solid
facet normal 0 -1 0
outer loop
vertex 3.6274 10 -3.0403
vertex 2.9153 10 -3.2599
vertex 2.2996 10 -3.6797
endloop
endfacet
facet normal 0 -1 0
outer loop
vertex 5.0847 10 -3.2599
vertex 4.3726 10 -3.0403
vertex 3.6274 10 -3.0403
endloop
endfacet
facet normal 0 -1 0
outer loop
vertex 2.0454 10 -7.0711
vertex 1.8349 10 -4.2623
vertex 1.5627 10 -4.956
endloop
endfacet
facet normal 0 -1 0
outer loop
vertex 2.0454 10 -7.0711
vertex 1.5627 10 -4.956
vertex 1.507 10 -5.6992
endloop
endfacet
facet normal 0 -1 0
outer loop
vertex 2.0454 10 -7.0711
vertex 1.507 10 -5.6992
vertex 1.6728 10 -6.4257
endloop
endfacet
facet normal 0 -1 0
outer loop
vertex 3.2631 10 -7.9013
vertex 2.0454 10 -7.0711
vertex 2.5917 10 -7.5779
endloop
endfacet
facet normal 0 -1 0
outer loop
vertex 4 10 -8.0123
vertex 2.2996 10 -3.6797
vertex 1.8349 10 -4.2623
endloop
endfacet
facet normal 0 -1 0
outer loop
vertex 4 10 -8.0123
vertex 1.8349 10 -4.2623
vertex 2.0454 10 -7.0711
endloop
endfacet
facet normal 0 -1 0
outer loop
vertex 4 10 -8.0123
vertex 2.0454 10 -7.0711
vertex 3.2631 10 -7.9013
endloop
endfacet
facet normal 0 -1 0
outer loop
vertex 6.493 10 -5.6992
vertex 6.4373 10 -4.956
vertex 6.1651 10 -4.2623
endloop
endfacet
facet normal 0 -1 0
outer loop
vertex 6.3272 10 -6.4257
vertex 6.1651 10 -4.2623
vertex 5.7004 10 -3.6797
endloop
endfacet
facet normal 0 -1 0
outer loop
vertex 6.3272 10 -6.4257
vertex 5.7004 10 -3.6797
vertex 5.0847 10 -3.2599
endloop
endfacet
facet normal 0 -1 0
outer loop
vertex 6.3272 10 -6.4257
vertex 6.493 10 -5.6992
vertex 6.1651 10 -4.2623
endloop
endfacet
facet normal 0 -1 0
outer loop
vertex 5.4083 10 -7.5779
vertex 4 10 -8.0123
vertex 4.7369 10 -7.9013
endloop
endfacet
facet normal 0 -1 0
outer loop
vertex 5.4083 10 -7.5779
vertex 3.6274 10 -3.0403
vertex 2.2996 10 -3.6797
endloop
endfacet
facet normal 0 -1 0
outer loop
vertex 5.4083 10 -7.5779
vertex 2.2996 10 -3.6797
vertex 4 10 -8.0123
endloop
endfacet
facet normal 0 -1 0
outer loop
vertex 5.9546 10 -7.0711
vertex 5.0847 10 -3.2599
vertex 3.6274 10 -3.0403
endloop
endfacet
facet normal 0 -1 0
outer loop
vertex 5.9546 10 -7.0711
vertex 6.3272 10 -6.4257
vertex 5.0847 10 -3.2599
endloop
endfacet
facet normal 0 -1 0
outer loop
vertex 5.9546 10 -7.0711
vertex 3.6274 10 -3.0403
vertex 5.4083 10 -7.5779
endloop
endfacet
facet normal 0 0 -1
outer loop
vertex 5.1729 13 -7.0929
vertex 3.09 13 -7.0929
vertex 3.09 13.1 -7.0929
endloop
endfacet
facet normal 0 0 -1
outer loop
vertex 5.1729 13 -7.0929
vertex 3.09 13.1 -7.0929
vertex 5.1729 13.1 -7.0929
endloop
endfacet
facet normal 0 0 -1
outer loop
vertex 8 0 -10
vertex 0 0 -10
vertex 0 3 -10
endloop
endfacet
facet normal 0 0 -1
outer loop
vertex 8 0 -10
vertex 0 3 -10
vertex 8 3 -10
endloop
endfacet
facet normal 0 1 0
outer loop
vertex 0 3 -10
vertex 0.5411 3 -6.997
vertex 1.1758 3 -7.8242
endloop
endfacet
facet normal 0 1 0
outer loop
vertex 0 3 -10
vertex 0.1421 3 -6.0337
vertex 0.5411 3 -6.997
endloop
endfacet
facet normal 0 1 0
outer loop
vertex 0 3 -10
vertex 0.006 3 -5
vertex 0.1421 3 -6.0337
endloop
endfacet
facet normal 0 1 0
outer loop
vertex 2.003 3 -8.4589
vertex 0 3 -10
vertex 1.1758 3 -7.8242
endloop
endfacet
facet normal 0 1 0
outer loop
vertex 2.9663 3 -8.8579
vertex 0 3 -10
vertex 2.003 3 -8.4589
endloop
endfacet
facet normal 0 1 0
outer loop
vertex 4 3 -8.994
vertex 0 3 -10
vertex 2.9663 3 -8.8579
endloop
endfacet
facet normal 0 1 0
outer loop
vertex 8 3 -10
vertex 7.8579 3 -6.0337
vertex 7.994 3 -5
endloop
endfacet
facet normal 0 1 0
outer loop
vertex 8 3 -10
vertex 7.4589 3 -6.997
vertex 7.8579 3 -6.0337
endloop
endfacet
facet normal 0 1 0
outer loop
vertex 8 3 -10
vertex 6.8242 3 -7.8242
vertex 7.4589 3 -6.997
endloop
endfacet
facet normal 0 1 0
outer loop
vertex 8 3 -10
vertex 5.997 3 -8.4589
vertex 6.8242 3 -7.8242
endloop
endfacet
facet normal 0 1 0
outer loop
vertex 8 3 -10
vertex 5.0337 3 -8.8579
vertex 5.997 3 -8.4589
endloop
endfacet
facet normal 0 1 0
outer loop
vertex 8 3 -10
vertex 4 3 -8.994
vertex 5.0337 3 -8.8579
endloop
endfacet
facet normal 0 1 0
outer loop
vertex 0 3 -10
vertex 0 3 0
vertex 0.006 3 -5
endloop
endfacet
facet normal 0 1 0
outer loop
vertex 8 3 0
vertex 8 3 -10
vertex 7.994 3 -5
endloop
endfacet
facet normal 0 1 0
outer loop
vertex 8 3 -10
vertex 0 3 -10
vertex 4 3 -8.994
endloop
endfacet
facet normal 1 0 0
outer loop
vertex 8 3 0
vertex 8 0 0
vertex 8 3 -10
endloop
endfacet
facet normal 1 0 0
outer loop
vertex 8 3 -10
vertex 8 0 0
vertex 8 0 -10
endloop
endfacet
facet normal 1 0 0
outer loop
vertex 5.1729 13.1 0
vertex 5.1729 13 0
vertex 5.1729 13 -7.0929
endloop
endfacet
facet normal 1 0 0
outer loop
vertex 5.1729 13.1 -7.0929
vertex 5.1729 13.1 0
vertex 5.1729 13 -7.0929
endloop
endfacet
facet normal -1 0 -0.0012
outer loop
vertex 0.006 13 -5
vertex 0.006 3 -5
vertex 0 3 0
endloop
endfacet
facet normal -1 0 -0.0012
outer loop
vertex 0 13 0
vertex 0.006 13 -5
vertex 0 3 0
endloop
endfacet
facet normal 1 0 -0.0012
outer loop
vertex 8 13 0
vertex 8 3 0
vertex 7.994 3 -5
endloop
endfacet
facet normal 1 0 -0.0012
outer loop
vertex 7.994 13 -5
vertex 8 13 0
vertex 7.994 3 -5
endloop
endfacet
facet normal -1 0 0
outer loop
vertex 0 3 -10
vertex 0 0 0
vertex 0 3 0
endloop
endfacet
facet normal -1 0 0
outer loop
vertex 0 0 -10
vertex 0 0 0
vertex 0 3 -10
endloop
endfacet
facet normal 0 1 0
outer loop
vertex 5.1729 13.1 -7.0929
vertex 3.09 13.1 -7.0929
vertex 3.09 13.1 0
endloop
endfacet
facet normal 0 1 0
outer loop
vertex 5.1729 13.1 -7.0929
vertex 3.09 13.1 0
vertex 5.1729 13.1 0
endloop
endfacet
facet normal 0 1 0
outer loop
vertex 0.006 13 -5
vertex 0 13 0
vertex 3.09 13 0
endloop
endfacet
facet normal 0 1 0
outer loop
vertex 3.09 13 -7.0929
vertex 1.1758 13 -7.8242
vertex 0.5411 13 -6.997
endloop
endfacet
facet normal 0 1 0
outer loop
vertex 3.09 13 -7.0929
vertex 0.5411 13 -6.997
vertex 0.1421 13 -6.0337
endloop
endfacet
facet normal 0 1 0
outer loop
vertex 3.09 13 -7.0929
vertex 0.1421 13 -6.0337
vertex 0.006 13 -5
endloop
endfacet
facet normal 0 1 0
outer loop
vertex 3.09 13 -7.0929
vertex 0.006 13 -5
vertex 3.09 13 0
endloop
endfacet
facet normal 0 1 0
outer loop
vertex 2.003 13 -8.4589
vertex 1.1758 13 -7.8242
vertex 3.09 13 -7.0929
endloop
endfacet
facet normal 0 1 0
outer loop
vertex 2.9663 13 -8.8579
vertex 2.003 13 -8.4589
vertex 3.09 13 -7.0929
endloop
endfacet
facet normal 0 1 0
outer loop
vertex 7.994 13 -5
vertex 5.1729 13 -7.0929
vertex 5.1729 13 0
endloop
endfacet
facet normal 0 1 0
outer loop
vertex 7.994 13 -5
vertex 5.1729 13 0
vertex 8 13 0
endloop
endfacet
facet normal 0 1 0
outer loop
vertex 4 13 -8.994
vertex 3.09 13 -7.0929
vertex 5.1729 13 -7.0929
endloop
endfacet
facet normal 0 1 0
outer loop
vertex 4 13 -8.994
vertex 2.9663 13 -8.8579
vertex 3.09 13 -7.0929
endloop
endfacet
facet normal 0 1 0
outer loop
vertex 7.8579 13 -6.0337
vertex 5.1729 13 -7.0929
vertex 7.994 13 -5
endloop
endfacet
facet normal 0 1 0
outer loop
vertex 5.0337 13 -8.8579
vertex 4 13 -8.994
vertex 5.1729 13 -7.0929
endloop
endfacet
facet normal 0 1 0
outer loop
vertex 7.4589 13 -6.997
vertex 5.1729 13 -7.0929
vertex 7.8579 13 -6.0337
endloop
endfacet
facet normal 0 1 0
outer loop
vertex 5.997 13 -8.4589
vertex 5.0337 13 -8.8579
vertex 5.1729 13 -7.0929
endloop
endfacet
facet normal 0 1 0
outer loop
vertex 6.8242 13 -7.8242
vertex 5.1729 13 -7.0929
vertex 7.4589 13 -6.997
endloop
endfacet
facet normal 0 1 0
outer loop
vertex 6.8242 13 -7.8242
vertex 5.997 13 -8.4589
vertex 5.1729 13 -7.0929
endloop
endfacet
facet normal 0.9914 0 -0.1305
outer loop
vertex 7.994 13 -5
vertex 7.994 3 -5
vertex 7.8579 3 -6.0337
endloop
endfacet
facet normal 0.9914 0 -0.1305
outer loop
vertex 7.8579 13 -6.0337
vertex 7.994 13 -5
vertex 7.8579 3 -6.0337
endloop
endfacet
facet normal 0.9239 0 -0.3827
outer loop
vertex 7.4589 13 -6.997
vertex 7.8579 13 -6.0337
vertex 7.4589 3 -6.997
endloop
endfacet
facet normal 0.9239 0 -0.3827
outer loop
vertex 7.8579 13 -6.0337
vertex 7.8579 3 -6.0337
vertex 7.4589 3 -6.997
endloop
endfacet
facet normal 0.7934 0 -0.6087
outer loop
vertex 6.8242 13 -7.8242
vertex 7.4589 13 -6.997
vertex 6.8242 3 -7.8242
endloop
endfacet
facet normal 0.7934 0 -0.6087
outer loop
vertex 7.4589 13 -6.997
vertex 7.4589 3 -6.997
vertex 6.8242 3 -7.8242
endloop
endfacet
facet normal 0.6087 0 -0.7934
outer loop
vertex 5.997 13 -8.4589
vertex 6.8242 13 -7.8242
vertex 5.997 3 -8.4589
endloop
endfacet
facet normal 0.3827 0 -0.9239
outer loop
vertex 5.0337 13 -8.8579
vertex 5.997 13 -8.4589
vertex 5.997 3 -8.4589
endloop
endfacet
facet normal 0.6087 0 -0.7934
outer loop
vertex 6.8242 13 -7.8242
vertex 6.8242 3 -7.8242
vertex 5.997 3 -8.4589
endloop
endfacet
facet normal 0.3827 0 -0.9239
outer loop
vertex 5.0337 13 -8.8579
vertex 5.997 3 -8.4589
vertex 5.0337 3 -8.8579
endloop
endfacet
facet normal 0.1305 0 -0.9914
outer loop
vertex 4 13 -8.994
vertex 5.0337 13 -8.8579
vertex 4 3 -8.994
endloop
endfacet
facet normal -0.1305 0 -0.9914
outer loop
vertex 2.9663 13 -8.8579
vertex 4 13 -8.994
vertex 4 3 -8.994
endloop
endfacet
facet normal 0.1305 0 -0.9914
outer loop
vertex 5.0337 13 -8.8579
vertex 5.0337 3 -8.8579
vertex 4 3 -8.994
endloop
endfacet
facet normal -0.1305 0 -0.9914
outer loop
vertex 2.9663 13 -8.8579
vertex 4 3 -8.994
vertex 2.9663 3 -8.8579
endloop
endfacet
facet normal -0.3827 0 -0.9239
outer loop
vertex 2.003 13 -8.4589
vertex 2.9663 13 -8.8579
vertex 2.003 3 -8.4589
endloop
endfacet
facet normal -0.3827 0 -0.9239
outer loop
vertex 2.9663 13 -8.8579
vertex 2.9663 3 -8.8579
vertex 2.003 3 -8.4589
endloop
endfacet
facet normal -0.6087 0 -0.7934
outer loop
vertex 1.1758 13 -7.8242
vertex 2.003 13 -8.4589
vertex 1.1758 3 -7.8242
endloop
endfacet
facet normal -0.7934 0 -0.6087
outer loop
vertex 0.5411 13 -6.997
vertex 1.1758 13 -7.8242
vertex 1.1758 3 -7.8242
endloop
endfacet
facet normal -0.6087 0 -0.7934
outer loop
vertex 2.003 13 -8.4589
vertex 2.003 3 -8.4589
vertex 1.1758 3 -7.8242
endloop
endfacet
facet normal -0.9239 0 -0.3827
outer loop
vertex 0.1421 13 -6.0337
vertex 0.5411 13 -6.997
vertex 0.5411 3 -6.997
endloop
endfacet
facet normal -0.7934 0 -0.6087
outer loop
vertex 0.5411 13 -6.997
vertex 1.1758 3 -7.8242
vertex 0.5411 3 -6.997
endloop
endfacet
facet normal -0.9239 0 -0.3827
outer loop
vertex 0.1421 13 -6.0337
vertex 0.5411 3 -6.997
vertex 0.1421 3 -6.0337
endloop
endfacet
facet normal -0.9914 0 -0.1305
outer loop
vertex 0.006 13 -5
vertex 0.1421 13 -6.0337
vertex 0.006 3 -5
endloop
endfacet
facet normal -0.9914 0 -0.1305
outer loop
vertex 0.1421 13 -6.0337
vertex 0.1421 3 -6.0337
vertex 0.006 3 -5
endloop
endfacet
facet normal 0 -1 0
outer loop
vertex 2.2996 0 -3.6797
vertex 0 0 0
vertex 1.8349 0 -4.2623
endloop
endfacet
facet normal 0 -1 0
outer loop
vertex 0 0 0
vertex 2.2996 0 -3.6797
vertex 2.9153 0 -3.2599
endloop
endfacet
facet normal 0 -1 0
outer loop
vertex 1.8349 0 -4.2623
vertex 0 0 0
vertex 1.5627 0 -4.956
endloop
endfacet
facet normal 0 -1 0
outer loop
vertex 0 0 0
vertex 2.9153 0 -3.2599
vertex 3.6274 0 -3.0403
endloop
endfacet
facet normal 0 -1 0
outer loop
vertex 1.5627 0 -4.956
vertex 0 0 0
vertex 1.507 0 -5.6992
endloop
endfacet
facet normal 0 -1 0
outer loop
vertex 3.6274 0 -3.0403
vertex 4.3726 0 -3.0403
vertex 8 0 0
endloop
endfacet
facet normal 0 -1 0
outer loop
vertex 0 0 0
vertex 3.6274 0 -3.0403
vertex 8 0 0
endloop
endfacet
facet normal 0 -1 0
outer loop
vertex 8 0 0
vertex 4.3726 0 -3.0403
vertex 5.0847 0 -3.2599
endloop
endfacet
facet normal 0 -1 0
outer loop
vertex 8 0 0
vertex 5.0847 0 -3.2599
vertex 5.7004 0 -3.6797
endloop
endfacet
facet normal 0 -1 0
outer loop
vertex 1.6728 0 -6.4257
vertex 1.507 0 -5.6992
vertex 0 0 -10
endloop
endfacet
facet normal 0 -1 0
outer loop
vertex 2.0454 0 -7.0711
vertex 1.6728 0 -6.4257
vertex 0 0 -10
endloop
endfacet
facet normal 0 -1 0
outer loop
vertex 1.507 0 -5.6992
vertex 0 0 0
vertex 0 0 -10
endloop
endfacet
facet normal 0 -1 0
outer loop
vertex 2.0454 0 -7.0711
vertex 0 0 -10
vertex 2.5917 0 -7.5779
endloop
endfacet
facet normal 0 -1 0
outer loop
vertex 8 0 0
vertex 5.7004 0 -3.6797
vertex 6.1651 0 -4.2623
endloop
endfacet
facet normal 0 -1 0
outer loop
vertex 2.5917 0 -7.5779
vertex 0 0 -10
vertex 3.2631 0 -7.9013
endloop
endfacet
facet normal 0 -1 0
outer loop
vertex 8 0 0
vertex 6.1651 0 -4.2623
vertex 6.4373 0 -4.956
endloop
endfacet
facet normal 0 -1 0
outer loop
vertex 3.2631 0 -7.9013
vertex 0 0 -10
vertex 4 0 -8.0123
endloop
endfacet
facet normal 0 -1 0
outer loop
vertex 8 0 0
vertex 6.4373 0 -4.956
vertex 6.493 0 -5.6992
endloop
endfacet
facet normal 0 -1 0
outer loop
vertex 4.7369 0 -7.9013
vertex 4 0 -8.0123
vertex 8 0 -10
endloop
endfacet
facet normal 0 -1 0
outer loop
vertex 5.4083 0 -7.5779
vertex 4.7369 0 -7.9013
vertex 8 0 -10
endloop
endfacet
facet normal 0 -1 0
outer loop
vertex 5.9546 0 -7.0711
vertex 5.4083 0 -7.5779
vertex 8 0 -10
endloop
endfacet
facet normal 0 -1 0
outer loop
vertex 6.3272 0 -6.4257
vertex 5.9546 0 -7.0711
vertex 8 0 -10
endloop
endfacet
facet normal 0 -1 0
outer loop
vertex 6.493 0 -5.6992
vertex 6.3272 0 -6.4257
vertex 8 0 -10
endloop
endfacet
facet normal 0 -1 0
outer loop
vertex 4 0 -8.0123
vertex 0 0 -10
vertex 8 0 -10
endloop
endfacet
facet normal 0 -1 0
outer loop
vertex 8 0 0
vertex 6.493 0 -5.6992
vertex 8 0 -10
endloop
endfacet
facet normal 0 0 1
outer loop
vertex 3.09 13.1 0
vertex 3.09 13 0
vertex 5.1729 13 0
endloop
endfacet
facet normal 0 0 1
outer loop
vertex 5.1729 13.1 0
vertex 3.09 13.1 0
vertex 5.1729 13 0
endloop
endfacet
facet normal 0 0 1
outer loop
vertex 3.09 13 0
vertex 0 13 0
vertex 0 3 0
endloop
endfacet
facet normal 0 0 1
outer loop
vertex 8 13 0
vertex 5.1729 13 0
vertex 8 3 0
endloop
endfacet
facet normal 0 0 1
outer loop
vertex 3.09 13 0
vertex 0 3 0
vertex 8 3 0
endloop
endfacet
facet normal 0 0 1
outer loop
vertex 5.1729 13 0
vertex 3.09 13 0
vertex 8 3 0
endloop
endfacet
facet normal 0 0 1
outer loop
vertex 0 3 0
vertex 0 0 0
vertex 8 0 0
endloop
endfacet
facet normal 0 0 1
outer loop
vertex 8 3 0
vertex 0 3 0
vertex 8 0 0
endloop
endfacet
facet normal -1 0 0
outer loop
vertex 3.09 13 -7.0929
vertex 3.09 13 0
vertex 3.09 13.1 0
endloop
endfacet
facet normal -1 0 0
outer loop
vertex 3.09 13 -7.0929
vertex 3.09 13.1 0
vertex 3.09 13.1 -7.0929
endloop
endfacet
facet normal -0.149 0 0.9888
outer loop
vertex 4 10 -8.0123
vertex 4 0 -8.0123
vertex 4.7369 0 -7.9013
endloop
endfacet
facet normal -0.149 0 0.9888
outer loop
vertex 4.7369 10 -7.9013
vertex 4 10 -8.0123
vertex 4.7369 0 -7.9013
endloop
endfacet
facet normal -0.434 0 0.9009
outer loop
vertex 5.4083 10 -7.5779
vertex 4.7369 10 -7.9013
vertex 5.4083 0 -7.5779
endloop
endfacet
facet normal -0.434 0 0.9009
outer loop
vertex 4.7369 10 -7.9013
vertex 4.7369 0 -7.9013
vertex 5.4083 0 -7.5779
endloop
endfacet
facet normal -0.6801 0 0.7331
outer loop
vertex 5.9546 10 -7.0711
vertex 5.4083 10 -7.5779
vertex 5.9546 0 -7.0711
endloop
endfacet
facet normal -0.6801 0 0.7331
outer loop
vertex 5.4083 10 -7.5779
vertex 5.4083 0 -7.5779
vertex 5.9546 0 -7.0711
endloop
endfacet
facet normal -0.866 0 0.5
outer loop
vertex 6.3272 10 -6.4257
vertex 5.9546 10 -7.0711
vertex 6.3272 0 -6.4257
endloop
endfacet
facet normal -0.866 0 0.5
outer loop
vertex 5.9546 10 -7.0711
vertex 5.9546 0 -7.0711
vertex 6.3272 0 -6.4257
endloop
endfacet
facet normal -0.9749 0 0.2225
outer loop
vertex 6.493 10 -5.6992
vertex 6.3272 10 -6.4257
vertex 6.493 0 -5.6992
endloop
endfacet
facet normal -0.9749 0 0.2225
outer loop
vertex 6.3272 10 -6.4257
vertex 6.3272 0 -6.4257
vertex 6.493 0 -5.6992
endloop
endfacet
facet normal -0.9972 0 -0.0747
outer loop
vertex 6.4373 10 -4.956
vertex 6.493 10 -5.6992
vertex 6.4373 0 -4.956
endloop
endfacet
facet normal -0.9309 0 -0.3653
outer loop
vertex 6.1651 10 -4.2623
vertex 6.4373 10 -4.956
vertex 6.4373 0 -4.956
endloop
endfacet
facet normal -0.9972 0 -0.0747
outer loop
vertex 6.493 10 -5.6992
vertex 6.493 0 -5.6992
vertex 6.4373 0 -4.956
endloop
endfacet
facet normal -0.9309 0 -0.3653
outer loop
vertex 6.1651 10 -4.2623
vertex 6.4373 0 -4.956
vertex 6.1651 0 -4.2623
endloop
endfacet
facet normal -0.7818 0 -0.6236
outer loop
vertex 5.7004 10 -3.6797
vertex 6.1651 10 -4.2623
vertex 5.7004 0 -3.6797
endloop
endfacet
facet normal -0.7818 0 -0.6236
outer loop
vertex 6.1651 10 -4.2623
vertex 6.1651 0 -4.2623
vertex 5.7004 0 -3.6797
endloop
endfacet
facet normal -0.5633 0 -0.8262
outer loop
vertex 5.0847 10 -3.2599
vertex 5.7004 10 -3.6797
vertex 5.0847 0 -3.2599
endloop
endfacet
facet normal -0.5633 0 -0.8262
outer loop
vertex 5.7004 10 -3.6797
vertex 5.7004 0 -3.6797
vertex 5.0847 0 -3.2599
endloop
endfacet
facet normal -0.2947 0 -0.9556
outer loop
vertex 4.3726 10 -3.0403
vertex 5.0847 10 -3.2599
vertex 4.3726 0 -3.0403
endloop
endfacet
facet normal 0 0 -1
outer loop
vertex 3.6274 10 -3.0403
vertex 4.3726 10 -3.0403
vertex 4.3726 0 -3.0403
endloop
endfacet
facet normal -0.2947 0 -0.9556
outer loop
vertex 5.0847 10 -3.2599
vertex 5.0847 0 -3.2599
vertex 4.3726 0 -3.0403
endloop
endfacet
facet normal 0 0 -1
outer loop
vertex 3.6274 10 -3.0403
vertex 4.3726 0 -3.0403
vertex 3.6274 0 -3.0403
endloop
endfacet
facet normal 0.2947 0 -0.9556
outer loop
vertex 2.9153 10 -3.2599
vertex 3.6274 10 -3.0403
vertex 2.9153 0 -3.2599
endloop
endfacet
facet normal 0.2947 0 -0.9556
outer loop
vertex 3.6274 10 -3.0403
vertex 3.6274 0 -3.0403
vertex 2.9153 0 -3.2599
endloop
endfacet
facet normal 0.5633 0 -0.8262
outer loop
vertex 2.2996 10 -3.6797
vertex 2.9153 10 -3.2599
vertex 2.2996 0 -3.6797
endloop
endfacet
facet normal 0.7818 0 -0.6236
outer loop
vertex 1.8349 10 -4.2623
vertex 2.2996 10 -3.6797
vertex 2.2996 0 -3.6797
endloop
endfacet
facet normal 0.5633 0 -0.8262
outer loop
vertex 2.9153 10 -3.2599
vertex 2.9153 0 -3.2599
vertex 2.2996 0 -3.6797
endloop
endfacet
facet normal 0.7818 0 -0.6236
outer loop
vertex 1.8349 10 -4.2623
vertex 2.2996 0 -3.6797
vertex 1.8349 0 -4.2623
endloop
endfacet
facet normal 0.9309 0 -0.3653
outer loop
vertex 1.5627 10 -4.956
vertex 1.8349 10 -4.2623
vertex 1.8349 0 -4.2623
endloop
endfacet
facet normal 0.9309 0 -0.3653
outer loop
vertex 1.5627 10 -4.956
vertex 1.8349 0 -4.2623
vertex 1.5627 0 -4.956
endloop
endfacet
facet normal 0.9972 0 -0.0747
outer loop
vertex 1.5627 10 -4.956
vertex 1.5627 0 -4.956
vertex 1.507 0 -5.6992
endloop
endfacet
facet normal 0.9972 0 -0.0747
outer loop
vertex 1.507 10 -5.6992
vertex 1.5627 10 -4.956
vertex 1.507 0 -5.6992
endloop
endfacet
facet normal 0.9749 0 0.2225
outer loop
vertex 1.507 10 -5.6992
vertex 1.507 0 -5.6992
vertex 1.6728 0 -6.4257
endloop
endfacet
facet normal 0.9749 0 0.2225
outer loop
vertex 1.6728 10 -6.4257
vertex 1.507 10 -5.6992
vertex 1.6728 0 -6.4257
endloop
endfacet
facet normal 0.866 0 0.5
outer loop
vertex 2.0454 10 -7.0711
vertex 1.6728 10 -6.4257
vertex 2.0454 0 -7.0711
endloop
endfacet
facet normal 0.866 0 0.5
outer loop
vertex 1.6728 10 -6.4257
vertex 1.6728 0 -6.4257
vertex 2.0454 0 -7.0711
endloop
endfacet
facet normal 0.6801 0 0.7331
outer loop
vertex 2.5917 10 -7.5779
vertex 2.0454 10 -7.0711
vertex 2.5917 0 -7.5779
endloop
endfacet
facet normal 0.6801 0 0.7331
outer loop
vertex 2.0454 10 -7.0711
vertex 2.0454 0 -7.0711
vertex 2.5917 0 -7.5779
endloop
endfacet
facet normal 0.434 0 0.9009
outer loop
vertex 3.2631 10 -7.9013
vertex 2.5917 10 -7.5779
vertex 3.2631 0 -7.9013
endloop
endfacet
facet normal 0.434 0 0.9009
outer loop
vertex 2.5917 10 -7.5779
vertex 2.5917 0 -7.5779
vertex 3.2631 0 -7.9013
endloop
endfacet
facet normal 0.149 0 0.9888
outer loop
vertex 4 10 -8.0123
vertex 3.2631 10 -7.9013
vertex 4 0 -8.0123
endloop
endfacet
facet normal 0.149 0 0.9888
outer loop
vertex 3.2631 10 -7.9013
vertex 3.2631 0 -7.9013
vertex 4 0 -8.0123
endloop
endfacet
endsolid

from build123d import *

# Parameters (mm, degrees)
SKETCH_1_W          = 8
SKETCH_1_H          = 10
EXTRUDE_1_DEPTH     = 3
EXTRUDE_2_DEPTH     = 10
SKETCH_3_R          = 2.5
CUT_EXTRUDE_1_DEPTH = 10
SKETCH_4_W          = 2.082831863
SKETCH_4_H          = 7.092942697
EXTRUDE_3_DEPTH     = 0.1


with BuildPart() as part:
    # 草图1 → 凸台-拉伸1 (new body)
    with BuildSketch(Plane(origin=(0, 0, 0), x_dir=(1, 0, 0), z_dir=(0, 1, 0))):
        with Locations((4, 5)):
            Rectangle(SKETCH_1_W, SKETCH_1_H)
    extrude(amount=EXTRUDE_1_DEPTH)

    # 草图2 → 凸台-拉伸2 (add)
    with BuildSketch(Plane(origin=(0, 3, 0), x_dir=(1, 0, 0), z_dir=(0, 1, 0))):
        with BuildLine():
            Line((0.005966473, 5), (0, 0))
            Line((0, 0), (8, 0))
            Line((8, 0), (7.994033527, 5))
            ThreePointArc((7.994033527, 5), (4, 8.994033527), (0.005966473, 5))
        make_face()
    extrude(amount=EXTRUDE_2_DEPTH)

    # 草图3 → 切除-拉伸1 (cut)
    with BuildSketch(Plane.XZ):
        with Locations(Location((4, -5.512337614, 0), (0, 0, 270))):
            Circle(SKETCH_3_R)
    extrude(amount=-CUT_EXTRUDE_1_DEPTH, mode=Mode.SUBTRACT)

    # 草图4 → 凸台-拉伸3 (add)
    with BuildSketch(Plane(origin=(0, 13, 0), x_dir=(1, 0, 0), z_dir=(0, 1, 0))):
        with Locations((4.131440846, 3.546471349)):
            Rectangle(SKETCH_4_W, SKETCH_4_H)
    extrude(amount=EXTRUDE_3_DEPTH)


solid = part.part
